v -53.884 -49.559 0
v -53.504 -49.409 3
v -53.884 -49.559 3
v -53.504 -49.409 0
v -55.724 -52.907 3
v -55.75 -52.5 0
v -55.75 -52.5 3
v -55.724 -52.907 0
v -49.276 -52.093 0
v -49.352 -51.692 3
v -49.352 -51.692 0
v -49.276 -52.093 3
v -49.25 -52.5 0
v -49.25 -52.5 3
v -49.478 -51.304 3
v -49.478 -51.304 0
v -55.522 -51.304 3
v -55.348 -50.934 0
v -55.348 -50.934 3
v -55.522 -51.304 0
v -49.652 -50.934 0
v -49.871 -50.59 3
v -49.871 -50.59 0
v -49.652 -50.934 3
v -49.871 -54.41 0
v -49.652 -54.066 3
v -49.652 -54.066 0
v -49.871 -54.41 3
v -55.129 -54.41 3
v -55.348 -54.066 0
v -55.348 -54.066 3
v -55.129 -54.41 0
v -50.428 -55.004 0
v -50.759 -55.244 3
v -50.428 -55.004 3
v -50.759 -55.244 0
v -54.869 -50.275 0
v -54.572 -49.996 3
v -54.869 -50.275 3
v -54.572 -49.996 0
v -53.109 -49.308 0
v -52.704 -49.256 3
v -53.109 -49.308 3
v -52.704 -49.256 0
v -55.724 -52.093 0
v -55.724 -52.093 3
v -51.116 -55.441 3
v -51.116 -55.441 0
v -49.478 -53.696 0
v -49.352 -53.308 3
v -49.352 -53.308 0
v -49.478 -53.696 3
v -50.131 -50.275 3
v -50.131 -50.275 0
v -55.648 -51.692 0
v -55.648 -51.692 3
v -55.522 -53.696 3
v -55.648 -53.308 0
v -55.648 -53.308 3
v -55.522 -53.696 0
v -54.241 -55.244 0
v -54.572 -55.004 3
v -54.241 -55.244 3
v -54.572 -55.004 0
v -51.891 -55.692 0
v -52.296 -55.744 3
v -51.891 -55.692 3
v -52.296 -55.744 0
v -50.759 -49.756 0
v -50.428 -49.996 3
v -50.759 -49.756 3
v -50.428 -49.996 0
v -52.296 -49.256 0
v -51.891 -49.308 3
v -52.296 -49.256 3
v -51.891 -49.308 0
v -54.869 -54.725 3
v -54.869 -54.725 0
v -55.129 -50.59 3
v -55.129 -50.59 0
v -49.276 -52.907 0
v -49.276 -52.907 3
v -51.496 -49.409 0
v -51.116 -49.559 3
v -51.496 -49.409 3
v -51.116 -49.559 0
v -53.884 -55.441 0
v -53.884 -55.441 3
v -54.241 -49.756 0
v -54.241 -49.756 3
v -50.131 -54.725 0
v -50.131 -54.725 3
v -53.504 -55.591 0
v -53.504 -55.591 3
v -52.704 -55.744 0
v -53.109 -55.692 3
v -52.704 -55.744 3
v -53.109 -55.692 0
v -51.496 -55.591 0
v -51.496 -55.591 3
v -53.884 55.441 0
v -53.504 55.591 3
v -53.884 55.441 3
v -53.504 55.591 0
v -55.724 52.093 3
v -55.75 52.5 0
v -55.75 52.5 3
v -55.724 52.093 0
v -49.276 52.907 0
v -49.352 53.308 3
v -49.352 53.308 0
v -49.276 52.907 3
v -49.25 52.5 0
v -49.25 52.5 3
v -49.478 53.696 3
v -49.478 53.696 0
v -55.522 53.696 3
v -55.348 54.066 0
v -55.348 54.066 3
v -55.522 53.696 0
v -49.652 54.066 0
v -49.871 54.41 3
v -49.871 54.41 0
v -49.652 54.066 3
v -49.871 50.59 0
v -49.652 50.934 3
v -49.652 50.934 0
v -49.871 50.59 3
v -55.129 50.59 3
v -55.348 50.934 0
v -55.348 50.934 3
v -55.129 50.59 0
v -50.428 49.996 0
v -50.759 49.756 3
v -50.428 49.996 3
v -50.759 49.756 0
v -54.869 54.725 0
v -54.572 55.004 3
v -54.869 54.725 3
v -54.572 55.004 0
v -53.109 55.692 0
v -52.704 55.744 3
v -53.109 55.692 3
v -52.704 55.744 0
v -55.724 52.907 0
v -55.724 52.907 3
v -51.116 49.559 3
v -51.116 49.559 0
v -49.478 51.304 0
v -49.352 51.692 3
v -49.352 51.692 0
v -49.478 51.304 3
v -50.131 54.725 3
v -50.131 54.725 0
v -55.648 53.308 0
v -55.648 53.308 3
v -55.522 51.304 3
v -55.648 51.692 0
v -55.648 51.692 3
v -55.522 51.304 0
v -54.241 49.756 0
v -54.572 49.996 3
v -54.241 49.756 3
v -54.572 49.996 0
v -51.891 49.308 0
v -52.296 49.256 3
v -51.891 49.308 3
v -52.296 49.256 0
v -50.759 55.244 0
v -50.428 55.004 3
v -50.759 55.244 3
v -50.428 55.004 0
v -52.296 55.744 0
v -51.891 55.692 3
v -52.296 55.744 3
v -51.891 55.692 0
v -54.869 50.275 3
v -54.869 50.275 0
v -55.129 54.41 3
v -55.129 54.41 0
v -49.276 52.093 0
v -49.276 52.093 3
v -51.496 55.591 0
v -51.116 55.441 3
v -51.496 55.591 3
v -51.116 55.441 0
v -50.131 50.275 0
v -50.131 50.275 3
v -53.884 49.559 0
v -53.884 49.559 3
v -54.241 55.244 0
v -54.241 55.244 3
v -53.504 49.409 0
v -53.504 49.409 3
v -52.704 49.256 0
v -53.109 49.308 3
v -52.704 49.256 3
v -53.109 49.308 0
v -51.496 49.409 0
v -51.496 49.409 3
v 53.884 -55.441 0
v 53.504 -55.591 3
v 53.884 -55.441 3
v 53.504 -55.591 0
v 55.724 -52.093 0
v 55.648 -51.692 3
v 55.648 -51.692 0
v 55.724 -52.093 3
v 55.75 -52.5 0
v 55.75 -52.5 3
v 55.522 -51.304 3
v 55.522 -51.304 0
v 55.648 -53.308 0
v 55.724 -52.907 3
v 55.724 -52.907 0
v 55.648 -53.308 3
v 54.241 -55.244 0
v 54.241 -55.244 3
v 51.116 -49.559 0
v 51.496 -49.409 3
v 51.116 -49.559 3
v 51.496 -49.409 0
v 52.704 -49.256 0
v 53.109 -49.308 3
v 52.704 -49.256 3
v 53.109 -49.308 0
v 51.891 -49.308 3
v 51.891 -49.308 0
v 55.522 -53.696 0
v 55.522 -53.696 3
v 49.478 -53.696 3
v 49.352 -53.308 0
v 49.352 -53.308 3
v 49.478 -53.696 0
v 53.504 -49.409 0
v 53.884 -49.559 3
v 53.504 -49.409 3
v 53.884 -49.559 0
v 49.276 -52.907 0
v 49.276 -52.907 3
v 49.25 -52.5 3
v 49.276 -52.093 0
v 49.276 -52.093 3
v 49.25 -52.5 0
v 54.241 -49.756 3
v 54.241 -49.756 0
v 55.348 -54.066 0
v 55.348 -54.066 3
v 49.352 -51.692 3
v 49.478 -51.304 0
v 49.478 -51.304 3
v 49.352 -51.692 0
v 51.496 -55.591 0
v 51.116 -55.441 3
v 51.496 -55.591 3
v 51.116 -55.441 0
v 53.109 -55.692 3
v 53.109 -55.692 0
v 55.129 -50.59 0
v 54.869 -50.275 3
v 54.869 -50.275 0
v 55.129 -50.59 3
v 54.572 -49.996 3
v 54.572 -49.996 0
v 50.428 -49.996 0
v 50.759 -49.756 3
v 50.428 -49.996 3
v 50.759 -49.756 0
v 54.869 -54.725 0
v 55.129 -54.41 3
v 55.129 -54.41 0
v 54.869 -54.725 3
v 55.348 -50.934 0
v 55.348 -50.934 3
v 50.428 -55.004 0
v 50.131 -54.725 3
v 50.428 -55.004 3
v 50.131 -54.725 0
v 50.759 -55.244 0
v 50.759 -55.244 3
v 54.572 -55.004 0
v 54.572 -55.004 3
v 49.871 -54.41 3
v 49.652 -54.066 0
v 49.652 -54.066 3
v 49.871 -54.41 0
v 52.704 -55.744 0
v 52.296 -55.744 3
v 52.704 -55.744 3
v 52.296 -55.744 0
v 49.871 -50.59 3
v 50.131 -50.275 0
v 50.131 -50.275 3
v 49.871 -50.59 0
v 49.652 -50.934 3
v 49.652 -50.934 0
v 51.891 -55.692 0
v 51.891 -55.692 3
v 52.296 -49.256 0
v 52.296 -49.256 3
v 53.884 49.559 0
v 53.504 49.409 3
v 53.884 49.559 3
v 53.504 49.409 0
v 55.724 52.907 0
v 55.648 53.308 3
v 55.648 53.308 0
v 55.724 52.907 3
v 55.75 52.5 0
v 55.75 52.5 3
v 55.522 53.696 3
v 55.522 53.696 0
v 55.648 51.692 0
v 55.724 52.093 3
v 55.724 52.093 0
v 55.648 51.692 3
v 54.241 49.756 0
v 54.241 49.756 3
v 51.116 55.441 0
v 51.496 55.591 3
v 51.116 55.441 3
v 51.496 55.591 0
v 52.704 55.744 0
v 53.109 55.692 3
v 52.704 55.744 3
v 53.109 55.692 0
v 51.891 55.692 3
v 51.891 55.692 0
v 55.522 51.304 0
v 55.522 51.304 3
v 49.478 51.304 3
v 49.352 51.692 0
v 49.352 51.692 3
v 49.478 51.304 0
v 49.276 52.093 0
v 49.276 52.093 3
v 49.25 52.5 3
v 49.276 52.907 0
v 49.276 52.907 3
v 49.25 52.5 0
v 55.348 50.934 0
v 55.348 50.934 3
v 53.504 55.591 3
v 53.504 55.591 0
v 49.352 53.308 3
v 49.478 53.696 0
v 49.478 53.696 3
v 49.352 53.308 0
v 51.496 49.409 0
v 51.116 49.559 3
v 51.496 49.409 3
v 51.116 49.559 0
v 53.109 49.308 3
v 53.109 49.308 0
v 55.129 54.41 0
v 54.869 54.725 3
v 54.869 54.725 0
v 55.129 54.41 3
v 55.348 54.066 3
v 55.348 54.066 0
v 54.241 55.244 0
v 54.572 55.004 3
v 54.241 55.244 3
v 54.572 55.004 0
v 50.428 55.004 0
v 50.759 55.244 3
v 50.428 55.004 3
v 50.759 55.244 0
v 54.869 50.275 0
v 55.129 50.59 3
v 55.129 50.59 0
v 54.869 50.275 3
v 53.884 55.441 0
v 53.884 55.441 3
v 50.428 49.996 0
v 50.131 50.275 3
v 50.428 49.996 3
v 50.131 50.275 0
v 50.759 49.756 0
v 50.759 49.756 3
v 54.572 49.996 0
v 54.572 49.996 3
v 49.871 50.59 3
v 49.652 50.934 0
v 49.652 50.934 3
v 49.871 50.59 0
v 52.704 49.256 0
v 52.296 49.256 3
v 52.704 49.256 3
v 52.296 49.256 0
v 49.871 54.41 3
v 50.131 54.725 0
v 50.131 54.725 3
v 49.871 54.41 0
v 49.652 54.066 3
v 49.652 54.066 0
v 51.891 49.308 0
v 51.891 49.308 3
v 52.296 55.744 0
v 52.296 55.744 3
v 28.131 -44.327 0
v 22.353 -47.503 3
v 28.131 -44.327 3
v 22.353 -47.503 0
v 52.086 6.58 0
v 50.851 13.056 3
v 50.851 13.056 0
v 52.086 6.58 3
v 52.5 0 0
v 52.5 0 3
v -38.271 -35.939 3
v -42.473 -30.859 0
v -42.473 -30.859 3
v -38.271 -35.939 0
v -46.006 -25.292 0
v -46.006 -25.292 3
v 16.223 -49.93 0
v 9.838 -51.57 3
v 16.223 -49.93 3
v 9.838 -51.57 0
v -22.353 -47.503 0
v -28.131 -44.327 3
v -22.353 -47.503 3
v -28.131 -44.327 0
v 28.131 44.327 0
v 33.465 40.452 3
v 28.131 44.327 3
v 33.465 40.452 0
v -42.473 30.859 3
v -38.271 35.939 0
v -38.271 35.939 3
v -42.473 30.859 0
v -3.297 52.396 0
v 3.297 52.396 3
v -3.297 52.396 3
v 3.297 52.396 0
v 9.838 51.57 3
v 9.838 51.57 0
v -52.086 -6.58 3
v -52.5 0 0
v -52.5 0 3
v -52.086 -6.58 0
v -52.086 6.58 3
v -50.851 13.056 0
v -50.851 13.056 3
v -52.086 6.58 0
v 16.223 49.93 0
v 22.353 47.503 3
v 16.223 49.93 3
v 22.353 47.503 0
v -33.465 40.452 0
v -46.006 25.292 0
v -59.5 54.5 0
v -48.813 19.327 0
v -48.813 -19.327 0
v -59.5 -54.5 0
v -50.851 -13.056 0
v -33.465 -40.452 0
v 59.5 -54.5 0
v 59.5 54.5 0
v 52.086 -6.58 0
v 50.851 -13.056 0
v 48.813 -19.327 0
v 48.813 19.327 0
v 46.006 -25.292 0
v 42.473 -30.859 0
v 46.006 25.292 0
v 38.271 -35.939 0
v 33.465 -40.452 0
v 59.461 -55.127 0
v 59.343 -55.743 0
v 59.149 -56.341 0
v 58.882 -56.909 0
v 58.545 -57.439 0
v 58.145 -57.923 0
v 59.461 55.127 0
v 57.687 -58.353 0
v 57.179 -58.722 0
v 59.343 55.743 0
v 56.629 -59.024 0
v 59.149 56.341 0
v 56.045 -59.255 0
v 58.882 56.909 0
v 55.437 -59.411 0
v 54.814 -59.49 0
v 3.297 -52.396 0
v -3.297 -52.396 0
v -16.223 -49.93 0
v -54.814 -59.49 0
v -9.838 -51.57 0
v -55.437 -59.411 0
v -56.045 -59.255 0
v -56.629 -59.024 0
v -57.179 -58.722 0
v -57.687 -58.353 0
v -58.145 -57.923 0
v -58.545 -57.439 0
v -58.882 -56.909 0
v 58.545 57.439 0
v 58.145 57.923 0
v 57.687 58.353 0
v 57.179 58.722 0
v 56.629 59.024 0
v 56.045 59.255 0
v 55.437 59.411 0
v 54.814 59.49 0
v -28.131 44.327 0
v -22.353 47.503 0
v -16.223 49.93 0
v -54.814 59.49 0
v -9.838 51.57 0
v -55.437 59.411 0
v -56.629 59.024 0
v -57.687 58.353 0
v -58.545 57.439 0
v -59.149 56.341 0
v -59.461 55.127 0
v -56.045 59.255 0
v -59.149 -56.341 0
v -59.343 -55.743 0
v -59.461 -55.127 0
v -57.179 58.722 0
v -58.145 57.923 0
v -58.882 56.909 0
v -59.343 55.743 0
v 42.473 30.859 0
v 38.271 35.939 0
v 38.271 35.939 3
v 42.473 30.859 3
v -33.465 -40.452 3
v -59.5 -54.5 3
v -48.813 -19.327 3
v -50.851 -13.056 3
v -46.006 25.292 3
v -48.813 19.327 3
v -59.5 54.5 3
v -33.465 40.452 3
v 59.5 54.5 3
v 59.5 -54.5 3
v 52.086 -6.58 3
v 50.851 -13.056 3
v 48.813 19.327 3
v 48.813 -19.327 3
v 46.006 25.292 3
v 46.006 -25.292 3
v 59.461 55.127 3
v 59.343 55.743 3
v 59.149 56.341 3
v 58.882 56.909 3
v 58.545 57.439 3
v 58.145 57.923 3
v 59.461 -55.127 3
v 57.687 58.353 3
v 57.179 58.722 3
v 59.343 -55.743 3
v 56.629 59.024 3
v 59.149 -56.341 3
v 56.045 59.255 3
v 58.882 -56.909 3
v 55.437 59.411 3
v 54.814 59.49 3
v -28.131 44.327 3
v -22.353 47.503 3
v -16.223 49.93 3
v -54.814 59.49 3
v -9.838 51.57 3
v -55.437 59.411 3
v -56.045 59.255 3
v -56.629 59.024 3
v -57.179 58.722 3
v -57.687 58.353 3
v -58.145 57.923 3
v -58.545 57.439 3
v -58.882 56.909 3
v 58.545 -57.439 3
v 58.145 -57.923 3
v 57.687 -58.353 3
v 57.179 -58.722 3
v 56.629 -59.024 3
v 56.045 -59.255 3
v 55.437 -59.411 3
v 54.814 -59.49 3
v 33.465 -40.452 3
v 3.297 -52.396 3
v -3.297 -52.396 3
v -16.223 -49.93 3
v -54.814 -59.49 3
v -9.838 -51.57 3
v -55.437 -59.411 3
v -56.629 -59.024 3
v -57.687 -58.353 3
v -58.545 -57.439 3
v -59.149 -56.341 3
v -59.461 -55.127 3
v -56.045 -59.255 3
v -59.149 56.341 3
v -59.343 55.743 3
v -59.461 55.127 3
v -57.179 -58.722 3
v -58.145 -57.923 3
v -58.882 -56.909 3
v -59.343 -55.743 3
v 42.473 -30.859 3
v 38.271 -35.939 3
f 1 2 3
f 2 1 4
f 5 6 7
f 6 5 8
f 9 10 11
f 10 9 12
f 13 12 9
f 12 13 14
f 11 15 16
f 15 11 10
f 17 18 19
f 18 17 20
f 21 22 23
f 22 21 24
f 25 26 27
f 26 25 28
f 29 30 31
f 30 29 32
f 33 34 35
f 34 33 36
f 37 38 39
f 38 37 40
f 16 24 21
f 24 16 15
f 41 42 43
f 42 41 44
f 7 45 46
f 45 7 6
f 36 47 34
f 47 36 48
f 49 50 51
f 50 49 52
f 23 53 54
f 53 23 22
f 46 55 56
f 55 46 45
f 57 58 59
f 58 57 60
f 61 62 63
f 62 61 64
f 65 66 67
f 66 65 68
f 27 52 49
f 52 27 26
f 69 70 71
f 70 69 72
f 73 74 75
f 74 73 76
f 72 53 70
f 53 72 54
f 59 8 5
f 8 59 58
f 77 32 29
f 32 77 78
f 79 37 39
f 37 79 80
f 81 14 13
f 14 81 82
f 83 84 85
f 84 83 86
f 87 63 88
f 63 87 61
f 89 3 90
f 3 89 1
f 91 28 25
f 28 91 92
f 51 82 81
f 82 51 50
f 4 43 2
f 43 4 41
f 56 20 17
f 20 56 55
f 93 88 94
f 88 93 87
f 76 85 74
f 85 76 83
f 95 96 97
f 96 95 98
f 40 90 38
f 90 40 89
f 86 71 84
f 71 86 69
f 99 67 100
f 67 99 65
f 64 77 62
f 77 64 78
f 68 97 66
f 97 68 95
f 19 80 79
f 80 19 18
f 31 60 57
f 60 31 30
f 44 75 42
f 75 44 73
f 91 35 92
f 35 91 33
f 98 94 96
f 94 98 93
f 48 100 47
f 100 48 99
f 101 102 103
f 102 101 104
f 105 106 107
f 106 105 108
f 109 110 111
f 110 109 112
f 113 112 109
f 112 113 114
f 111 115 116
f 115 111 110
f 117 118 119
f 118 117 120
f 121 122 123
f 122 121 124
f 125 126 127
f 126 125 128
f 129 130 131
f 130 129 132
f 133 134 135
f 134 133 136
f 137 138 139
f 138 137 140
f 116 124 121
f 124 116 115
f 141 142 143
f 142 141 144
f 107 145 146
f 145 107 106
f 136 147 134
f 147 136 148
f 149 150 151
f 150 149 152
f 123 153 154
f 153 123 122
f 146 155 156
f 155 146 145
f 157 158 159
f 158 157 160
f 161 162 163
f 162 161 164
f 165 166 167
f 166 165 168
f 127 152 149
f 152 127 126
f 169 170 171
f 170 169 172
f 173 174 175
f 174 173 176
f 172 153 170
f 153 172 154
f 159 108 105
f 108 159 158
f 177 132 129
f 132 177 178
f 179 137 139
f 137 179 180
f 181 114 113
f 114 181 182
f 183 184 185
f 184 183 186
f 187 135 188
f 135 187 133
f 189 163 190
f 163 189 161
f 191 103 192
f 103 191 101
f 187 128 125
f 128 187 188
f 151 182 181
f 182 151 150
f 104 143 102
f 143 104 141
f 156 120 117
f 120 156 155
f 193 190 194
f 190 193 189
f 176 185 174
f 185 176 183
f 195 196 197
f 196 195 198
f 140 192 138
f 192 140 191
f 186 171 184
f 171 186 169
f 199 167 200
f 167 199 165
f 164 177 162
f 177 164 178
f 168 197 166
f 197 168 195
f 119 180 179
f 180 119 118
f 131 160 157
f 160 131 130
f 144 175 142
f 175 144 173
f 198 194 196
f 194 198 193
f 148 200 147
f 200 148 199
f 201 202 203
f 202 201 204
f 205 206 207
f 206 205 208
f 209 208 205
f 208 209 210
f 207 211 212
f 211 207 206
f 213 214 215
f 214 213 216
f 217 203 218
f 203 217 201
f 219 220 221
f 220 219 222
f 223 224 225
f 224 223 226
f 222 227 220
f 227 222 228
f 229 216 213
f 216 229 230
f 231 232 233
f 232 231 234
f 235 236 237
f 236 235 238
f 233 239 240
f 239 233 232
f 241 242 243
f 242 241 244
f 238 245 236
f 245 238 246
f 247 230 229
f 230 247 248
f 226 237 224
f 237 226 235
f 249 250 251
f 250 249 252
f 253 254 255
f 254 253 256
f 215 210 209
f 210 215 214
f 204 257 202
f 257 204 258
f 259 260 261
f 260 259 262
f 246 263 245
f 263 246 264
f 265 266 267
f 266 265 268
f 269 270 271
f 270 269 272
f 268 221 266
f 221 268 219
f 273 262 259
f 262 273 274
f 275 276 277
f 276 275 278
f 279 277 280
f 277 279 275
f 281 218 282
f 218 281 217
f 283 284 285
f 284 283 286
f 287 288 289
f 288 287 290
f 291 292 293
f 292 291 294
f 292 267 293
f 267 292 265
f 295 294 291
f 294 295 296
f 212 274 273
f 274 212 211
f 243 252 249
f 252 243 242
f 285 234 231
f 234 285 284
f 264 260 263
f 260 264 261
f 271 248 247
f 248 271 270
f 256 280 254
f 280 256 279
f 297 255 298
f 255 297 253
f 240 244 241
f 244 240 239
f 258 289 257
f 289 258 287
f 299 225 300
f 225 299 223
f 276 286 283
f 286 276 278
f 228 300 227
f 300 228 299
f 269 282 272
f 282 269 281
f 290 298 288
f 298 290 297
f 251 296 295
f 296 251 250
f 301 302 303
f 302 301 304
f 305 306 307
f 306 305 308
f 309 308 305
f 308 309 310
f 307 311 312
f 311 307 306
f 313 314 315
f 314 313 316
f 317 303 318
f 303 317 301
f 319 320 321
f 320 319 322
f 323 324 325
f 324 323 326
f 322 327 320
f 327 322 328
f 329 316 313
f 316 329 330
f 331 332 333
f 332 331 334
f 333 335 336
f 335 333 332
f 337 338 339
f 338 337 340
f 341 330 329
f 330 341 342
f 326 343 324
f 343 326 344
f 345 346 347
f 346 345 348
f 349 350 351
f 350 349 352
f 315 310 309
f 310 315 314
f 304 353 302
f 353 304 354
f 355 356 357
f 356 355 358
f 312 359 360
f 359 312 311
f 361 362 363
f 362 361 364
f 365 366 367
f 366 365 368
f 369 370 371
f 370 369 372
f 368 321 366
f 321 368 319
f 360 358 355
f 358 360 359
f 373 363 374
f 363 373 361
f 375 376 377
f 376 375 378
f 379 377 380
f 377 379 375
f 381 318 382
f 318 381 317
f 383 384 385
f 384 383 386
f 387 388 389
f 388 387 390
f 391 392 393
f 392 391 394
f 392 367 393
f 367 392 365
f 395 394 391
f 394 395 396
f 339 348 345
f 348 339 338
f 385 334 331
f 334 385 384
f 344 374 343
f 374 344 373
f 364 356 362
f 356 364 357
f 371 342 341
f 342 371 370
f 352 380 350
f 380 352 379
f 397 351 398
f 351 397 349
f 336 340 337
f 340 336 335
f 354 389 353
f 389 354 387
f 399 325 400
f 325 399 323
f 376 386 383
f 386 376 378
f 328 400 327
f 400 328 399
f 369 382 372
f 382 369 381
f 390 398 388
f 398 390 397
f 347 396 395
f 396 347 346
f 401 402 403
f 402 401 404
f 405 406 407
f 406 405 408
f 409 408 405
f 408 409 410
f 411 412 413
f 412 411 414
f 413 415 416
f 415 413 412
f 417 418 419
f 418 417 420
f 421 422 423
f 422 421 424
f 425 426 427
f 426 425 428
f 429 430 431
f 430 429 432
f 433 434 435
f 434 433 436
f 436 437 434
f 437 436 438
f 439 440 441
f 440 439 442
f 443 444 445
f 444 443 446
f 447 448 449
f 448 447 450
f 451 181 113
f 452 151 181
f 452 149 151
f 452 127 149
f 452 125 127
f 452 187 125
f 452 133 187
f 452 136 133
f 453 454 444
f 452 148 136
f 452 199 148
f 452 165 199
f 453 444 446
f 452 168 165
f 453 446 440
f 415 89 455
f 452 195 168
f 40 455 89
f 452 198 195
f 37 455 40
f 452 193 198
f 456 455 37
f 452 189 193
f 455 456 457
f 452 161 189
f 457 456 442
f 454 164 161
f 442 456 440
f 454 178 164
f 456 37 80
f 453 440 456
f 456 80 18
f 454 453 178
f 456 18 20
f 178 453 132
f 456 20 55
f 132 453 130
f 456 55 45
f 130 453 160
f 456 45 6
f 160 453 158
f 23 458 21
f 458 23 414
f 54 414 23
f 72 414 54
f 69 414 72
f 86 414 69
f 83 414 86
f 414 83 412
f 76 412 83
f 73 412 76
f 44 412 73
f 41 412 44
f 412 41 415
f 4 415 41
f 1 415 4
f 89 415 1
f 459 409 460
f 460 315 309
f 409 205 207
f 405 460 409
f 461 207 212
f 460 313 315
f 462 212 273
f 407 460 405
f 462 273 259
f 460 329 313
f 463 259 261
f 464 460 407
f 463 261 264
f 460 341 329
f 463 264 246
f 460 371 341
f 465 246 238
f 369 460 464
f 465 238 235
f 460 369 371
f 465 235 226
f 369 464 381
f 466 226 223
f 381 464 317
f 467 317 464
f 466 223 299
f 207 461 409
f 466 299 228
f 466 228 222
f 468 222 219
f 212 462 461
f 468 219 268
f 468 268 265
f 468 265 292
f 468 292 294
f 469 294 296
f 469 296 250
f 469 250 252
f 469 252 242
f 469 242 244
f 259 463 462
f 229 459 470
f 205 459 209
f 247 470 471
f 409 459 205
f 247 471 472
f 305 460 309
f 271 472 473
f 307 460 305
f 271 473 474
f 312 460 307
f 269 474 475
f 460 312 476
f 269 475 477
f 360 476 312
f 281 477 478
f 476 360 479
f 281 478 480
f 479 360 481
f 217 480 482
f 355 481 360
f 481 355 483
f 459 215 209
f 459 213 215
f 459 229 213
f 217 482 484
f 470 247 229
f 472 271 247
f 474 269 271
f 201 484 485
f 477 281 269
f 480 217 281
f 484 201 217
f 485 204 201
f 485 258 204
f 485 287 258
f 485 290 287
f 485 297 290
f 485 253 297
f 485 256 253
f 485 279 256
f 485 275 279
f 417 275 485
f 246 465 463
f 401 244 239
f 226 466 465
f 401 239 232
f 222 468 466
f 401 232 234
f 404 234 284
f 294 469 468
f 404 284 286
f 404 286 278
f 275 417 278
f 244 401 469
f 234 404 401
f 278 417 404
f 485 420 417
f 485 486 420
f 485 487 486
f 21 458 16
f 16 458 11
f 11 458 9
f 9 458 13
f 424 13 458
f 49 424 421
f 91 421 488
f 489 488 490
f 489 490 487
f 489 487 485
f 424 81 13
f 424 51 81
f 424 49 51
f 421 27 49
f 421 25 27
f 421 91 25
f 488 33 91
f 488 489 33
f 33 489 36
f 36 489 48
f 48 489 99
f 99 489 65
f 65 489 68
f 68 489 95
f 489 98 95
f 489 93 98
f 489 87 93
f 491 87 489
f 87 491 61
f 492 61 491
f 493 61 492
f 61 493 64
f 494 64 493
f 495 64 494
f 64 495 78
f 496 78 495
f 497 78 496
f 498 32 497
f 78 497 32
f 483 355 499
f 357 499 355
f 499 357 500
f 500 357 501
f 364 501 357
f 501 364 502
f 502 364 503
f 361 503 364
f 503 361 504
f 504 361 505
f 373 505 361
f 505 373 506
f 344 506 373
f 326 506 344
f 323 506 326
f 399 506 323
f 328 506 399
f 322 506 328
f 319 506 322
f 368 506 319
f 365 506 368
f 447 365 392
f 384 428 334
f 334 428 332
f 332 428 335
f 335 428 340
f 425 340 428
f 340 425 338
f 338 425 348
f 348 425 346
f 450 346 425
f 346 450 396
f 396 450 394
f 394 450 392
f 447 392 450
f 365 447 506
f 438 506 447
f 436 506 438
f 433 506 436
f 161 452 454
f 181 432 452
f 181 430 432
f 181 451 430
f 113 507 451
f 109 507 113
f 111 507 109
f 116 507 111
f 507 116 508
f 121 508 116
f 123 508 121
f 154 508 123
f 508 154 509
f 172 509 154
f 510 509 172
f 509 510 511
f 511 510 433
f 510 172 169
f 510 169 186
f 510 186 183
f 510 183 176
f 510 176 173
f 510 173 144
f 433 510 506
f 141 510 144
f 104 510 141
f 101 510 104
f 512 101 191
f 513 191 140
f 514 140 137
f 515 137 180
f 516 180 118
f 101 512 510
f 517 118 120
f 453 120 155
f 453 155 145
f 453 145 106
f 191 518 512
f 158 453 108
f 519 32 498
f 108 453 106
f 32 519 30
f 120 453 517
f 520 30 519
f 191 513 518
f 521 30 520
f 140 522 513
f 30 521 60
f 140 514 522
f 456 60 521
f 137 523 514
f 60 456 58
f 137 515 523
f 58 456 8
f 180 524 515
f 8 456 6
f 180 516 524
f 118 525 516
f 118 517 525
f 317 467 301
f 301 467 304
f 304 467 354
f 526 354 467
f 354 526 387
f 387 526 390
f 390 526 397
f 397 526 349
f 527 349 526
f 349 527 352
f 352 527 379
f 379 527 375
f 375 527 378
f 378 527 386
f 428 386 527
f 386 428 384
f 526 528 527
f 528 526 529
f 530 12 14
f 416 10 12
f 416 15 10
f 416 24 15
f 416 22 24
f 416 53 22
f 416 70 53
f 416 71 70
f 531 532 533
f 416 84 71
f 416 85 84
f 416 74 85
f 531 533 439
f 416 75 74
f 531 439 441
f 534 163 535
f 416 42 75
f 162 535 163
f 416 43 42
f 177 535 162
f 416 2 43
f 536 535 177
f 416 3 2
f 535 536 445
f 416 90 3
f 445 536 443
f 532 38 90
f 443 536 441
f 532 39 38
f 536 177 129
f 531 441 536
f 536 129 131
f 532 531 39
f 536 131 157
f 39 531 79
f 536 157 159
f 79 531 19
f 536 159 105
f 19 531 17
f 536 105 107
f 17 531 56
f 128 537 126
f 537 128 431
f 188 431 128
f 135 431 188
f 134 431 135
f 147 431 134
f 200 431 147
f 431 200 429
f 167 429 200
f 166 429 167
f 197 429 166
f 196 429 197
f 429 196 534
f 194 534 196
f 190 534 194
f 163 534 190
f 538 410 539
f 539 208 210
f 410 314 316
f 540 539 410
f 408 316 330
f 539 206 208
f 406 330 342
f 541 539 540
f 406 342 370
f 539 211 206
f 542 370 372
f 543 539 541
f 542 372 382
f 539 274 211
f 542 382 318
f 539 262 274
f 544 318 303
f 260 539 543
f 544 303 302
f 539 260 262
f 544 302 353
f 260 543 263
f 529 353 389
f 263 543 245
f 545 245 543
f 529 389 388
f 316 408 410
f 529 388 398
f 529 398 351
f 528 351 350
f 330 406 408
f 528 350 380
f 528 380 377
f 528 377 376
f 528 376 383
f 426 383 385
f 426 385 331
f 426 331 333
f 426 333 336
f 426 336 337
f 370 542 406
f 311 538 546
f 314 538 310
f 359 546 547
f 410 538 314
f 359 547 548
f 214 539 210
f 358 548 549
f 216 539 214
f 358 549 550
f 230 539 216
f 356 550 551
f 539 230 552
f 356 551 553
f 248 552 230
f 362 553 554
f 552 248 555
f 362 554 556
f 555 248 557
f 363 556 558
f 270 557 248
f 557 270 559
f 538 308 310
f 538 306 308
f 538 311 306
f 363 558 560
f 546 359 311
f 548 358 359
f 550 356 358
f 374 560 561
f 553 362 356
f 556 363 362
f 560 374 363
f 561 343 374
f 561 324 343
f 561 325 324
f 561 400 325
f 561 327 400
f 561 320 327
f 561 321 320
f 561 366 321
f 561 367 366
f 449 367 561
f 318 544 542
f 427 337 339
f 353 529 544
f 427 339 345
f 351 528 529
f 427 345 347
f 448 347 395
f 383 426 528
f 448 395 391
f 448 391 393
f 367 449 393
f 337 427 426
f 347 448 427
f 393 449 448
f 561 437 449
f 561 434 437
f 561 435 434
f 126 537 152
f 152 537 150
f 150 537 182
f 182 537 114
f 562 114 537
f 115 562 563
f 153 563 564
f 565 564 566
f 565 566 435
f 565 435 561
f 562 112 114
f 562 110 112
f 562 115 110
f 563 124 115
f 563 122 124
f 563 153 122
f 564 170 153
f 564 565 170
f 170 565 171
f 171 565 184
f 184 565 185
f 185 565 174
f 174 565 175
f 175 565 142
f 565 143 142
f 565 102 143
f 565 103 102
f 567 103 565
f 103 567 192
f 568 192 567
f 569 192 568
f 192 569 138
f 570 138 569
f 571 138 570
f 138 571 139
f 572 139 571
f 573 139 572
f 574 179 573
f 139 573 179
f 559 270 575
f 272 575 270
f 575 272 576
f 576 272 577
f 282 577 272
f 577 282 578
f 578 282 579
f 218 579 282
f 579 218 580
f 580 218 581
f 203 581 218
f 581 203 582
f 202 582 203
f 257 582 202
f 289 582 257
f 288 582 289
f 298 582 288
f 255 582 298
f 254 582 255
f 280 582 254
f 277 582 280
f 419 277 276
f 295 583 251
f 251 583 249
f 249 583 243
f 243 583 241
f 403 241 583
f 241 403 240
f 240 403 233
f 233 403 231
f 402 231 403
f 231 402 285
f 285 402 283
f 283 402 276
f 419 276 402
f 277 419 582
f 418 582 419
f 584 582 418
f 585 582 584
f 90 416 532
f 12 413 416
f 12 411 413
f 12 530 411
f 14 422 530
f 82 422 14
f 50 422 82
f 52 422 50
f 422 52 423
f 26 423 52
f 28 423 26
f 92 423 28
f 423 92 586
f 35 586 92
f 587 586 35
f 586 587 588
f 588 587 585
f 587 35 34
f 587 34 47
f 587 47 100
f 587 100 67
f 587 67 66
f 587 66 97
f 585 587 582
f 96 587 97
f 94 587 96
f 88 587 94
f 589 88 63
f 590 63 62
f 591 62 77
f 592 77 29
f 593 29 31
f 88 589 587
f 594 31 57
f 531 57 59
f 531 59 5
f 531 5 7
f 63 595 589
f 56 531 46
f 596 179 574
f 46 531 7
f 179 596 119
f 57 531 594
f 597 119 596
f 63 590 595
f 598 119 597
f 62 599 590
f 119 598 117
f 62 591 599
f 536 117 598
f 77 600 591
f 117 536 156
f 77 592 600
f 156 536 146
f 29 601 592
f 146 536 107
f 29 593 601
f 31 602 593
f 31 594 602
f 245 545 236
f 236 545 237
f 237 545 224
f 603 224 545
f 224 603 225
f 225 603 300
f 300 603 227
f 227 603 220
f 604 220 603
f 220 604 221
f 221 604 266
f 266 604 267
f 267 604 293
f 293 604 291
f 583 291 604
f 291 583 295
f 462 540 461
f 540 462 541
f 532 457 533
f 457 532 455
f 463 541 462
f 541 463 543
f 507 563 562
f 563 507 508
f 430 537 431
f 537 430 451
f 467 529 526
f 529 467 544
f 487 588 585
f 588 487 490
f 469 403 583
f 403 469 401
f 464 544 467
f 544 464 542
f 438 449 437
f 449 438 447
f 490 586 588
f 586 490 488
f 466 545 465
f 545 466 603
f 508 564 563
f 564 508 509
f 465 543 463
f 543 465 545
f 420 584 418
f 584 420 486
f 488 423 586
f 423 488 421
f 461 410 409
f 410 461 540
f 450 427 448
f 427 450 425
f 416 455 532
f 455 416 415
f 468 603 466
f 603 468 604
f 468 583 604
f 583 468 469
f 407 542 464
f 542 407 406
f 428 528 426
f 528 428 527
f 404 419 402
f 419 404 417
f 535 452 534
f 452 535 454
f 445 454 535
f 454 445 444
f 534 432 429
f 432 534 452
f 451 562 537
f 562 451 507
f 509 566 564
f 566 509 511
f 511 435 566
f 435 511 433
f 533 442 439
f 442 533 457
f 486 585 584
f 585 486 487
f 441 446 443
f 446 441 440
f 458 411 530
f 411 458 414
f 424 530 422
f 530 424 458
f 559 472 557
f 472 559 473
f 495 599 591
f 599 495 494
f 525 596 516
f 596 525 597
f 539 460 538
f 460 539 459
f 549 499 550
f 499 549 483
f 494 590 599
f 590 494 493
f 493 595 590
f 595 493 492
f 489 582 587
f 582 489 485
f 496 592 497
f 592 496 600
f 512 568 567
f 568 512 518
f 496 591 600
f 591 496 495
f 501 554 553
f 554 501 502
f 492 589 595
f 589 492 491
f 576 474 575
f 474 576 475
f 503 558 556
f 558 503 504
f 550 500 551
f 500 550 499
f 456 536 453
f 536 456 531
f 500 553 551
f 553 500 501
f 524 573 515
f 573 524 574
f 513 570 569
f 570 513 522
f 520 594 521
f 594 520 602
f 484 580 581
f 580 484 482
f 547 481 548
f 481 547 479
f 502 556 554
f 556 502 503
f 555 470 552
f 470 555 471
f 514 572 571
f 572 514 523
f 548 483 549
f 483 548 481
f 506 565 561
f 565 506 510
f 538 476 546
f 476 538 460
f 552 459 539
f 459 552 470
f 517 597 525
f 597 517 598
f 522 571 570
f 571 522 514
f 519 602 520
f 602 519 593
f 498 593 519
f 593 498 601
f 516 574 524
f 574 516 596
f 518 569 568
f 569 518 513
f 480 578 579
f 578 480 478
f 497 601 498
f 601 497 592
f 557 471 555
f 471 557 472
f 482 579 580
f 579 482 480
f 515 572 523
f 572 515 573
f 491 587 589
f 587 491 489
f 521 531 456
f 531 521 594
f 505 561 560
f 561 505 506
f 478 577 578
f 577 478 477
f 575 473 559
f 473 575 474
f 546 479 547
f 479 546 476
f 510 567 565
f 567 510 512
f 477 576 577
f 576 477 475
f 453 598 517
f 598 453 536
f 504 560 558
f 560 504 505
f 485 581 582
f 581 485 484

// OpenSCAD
$fn = 50;

difference() {
	union() {
		hull() {
			translate(v = [-54.5, 54.5, 0]) {
				cylinder(h = 3, r = 5);
			}
			translate(v = [54.5, 54.5, 0]) {
				cylinder(h = 3, r = 5);
			}
			translate(v = [-54.5, -54.5, 0]) {
				cylinder(h = 3, r = 5);
			}
			translate(v = [54.5, -54.5, 0]) {
				cylinder(h = 3, r = 5);
			}
		}
	}
	union() {
		translate(v = [-52.5, -52.5, -100.0]) {
			cylinder(h = 200, r = 3.25);
		}
		translate(v = [-52.5, 52.5, -100.0]) {
			cylinder(h = 200, r = 3.25);
		}
		translate(v = [52.5, -52.5, -100.0]) {
			cylinder(h = 200, r = 3.25);
		}
		translate(v = [52.5, 52.5, -100.0]) {
			cylinder(h = 200, r = 3.25);
		}
		translate(v = [-52.5, -52.5, -100.0]) {
			cylinder(h = 200, r = 1.8);
		}
		translate(v = [-52.5, 52.5, -100.0]) {
			cylinder(h = 200, r = 1.8);
		}
		translate(v = [52.5, -52.5, -100.0]) {
			cylinder(h = 200, r = 1.8);
		}
		translate(v = [52.5, 52.5, -100.0]) {
			cylinder(h = 200, r = 1.8);
		}
		cylinder(h = 3, r = 52.5);
	}
}
